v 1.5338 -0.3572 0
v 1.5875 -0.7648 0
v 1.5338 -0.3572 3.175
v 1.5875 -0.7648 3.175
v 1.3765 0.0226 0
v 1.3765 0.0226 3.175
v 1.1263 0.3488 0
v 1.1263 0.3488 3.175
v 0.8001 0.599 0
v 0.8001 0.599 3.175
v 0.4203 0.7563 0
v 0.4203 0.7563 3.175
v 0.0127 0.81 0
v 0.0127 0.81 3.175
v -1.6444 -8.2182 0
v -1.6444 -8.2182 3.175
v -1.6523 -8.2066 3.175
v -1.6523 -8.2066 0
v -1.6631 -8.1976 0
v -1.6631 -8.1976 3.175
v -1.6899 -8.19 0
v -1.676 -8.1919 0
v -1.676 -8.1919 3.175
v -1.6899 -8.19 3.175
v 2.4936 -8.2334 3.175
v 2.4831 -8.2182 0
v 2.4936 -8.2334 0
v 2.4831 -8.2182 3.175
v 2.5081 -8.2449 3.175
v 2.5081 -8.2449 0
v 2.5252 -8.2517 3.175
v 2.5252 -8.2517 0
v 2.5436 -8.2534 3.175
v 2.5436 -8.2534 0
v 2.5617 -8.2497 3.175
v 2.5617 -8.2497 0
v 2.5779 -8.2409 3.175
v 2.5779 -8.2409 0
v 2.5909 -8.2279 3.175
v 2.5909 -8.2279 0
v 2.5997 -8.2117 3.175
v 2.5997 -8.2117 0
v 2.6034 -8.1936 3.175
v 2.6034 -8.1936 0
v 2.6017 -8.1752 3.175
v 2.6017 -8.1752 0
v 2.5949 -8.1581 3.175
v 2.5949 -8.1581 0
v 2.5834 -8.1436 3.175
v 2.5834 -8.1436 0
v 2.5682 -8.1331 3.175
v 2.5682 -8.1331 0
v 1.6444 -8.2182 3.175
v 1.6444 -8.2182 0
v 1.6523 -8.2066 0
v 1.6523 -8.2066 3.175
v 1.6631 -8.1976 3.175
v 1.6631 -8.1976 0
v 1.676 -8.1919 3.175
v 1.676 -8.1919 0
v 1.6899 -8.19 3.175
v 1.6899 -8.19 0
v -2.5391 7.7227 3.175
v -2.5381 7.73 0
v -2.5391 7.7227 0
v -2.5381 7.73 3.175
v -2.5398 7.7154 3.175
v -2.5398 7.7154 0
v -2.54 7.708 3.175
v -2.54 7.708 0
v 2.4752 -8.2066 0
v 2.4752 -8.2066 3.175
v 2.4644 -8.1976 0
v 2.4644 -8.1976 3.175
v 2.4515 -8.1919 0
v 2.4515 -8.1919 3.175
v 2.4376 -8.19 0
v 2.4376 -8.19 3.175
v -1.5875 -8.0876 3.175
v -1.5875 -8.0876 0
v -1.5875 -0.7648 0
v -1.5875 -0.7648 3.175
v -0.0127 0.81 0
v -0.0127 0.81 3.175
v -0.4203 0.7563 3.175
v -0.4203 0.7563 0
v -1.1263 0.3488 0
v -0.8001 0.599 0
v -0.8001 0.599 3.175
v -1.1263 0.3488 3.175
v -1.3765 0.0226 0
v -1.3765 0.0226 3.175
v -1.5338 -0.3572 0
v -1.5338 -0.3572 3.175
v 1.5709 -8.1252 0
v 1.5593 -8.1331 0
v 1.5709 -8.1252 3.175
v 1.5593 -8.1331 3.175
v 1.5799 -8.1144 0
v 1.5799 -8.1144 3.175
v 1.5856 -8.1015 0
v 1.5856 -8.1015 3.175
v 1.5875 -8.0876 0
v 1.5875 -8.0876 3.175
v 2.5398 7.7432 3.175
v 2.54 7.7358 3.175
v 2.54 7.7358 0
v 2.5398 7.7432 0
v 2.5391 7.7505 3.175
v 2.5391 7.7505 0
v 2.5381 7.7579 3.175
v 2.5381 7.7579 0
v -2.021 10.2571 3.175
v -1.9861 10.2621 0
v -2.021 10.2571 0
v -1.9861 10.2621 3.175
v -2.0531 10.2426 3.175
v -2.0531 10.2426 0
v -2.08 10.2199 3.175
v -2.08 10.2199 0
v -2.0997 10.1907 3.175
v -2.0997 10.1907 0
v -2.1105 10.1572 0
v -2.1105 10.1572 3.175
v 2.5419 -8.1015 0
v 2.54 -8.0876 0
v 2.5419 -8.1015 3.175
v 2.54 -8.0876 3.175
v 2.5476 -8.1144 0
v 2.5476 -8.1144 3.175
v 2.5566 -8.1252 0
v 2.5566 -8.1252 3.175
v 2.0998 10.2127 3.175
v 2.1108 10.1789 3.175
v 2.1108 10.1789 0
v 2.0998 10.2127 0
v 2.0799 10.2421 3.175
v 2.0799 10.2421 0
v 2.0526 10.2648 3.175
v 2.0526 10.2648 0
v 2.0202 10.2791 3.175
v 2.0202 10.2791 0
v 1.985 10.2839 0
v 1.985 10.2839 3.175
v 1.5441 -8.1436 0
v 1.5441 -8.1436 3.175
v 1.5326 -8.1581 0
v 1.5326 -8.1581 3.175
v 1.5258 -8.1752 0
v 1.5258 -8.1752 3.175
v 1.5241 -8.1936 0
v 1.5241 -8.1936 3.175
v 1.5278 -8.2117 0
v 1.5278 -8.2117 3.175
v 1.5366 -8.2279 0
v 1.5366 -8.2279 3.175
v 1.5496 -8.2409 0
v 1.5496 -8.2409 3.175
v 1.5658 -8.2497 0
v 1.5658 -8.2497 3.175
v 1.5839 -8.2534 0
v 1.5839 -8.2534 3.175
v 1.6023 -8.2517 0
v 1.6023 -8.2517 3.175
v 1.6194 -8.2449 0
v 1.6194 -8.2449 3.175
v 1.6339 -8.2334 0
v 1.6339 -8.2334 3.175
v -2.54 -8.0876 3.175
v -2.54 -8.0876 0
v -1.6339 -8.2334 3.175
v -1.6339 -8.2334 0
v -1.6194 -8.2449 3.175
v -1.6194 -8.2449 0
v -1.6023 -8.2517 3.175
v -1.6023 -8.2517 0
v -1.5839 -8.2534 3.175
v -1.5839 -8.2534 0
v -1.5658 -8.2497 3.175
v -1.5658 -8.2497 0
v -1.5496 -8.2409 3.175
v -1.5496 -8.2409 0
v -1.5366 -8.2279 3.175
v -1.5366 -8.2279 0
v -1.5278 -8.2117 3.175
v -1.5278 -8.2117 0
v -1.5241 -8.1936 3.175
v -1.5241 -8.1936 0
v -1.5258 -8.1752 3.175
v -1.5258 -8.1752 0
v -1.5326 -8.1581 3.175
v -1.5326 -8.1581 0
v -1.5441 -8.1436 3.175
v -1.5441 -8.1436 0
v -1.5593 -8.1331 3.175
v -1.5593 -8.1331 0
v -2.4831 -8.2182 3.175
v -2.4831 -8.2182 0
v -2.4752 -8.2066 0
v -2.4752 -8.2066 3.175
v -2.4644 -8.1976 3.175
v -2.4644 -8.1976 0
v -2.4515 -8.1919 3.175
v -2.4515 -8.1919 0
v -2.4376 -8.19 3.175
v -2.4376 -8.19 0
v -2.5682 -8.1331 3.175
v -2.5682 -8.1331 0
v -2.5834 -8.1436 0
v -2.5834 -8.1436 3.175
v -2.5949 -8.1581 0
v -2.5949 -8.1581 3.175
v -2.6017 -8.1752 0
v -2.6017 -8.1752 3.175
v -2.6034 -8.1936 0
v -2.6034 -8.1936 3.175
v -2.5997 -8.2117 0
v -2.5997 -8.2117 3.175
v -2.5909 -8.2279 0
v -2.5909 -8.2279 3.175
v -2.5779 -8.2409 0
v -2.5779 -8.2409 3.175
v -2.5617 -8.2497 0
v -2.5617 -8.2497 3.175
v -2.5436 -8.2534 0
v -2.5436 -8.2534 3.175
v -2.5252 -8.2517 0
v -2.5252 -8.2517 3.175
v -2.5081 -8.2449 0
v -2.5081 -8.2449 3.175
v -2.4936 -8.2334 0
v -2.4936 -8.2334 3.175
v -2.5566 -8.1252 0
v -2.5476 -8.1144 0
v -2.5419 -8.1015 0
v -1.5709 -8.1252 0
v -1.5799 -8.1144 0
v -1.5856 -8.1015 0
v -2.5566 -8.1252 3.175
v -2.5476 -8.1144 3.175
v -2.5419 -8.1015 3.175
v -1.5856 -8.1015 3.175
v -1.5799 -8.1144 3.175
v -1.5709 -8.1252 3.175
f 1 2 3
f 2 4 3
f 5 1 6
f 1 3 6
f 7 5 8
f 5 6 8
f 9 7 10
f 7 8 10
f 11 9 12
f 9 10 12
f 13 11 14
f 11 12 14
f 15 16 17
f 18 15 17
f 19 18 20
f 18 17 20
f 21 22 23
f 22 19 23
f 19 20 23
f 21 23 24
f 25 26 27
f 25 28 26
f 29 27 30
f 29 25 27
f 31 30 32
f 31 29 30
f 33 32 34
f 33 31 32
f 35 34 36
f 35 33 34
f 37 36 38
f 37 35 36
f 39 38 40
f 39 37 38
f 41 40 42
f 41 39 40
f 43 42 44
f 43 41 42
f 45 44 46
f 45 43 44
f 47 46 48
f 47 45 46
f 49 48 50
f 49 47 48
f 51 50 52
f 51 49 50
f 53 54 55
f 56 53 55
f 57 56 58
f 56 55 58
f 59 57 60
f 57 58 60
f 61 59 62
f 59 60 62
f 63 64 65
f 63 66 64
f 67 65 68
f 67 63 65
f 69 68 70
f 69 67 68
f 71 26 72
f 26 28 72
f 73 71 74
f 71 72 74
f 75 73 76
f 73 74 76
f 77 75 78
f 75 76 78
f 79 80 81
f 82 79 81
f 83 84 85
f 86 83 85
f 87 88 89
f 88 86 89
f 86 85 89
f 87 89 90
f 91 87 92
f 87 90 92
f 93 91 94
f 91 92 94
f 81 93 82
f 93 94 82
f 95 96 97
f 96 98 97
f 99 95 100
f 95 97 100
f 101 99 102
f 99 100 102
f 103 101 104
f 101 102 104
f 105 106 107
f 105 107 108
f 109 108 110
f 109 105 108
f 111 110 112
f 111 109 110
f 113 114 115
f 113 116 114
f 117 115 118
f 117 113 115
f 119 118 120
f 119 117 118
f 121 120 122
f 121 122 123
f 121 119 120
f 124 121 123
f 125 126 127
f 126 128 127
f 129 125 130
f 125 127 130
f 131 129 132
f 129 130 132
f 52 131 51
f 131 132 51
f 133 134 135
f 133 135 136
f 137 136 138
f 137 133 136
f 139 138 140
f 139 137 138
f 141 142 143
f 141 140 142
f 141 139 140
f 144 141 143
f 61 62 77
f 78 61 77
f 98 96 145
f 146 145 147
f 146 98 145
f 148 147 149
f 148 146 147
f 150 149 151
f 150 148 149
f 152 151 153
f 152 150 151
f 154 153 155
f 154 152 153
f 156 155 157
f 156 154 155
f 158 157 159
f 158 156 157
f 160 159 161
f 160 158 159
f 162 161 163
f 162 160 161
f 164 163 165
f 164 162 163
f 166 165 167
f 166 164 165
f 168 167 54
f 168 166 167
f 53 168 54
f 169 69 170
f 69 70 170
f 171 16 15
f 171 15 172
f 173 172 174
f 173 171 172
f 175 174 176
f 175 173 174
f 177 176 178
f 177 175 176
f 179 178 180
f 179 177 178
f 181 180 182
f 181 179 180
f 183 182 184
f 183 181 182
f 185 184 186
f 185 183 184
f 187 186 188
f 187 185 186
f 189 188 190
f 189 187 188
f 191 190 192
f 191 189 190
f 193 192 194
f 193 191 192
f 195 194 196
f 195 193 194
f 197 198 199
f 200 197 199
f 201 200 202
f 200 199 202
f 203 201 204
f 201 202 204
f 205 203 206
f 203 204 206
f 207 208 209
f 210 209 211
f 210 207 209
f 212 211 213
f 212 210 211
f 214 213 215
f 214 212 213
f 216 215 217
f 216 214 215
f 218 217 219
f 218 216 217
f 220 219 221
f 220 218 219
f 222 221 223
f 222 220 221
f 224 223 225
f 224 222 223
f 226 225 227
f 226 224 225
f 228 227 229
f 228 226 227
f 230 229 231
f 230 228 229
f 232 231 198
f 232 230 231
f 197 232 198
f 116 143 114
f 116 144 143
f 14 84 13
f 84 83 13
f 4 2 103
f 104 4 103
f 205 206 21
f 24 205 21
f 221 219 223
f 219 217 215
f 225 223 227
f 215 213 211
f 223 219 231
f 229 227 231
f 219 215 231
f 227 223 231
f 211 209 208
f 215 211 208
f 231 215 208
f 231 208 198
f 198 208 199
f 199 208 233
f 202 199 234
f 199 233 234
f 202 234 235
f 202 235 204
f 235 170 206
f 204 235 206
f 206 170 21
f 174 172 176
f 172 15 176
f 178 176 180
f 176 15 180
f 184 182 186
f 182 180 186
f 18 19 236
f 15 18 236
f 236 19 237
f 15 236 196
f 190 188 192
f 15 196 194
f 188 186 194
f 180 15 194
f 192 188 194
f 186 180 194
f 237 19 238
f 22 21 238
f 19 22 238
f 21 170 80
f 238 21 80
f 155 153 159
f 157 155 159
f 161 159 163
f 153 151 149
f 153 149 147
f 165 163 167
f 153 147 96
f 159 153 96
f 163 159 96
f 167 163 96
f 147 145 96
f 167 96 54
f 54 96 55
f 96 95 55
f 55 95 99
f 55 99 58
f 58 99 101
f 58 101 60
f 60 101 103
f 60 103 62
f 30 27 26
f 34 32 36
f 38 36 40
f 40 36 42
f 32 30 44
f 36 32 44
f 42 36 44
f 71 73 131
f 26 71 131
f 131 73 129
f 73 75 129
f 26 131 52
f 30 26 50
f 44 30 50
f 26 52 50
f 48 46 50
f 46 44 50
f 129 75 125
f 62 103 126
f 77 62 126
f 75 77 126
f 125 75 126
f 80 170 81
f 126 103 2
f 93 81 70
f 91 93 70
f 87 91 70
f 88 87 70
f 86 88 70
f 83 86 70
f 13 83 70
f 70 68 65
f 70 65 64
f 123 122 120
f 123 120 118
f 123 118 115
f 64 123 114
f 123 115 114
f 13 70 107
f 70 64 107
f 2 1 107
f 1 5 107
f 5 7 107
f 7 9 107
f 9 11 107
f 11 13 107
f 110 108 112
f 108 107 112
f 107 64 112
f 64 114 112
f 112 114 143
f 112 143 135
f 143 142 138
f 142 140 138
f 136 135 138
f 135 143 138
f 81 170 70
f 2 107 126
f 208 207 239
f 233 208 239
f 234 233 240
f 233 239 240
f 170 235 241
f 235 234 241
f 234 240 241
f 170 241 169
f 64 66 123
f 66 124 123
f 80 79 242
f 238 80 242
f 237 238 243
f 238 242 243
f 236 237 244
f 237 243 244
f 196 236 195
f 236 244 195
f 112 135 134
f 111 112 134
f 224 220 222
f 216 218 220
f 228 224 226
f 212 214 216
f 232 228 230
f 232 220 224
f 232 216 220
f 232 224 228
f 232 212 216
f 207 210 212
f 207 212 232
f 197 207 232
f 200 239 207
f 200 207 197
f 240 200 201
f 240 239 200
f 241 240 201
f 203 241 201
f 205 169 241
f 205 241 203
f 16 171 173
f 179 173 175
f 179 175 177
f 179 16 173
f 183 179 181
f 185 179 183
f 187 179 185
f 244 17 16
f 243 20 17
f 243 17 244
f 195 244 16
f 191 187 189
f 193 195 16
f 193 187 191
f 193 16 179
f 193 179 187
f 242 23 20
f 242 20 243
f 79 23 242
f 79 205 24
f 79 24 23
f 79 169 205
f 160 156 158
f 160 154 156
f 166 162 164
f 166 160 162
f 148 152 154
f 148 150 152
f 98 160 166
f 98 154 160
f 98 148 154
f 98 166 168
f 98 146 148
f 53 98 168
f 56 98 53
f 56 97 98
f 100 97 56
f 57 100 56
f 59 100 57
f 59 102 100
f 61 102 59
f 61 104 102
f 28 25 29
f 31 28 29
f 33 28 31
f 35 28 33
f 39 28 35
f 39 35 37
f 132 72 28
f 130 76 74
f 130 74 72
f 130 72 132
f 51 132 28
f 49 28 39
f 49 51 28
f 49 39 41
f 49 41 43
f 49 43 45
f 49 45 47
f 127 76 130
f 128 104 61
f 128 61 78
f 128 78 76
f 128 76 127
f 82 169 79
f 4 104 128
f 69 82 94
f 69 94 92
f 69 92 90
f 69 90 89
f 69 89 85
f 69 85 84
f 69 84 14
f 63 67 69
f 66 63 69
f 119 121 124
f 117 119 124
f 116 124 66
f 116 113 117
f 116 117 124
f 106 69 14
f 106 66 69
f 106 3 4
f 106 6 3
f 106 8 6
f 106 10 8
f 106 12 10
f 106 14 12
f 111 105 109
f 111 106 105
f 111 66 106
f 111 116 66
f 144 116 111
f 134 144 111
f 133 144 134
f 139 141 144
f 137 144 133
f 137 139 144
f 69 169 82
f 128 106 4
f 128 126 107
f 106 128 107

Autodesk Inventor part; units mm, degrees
ref_plane "YZ Plane" through (0, 0, 0) normal (1, 0, 0) x (0, 1, 0)
ref_plane "XZ Plane" through (0, 0, 0) normal (0, 1, 0) x (-1, 0, 0)
ref_plane "XY Plane" through (0, 0, 0) normal (0, 0, 1) x (1, 0, 0)
sketch "Sketch1" plane through (0, 0, 0) normal (0, 0, 1) x (1, 0, 0)
  line L0 (-2.54, -8.19) -> (2.54, -8.19)
  line L1 (2.54, -8.19) -> (2.54, 8.19)
  line L2 (-2.54, 8.19) -> (-2.54, -8.19)
  line L3 (-2.54, -8.19) -> (2.54, 8.19) construction
  line L4 (2.54, -8.19) -> (-2.54, 8.19) construction
  circle A0 centre (0, 16.6545) radius 2.5 construction
  circle A1 centre (0, 16.6545) radius 5
  arc A2 (6.8029, 15.0051) -> (-6.8044, 15.0114) centre (0, 16.6545) ccw
  line L5 (-2.54, 8.19) -> (-2.54, 10.2591)
  line L6 (2.54, 8.19) -> (2.54, 10.2869)
  line L7 (0, 0) -> (0, 10.7842) construction
  line L8 (-2.54, 10.2591) -> (-3.9944, 10.2511)
  line L9 (2.54, 10.2869) -> (3.9944, 10.2948)
  line L10 (-3.9944, 10.2511) -> (-4.1214, 3.9003)
  line L11 (3.9944, 10.2948) -> (4.1214, 3.9454)
  line L12 (-4.1214, 3.9003) -> (-6.8044, 15.0114)
  line L13 (4.1214, 3.9454) -> (6.8029, 15.0051)
  line L14 (0, 0) -> (0, 22.9511) construction
  point P0 (-3.2672, 10.2551)
  dimension "d2" = 5
  dimension "d3" = 10
  dimension "d4" = 14
  dimension "d8" = 1.5815
  dimension "d9" = 1.5815
  dimension "d10" = 6.35
  dimension "d11" = 6.35
  dimension "d18" = 1.4545
  dimension "d19" = 1.4545
  dimension "d31" = 2.54
  dimension "d32" = 2.54
  dimension "d33" = 0
extrude "Plate1" add sketch "Sketch1" along normal blind 3.175
sketch "Sketch2" plane through (0, 0, 0) normal (0, 0, -1) x (-1, 0, 0)
  circle A0 centre (0, 16.6545) radius 5 projected
  line L0 (-3.9944, 10.2948) -> (-4.1214, 3.9454) projected
  line L1 (-2.54, 10.2869) -> (-3.9944, 10.2948) projected
  line L2 (-2.54, -8.19) -> (-2.54, 10.2869) projected
  line L3 (2.54, -8.19) -> (-2.54, -8.19) projected
  line L4 (2.54, 10.2591) -> (2.54, -8.19) projected
  line L5 (3.9944, 10.2511) -> (2.54, 10.2591) projected
  line L6 (4.1214, 3.9003) -> (3.9944, 10.2511) projected
  line L7 (6.8044, 15.0114) -> (4.1214, 3.9003) projected
  arc A1 (6.8044, 15.0114) -> (-6.8029, 15.0051) centre (0, 16.6545) ccw projected
  line L8 (-4.1214, 3.9454) -> (-6.8029, 15.0051) projected
  line L9 (-1.5875, -17.19) -> (1.5875, -17.19)
  line L10 (1.5875, -17.19) -> (1.5875, 0.81)
  line L11 (1.5875, 0.81) -> (-1.5875, 0.81)
  line L12 (-1.5875, 0.81) -> (-1.5875, -17.19)
  line L13 (-1.5875, -17.19) -> (1.5875, 0.81) construction
  line L14 (1.5875, -17.19) -> (-1.5875, 0.81) construction
  point P0 (0, 0)
  point P1 (0, -8.19)
  dimension "d14" = 3.175
extrude "Extrusion1" cut sketch "Sketch2" against normal blind 25.4 contours L12 L11 L10 L3 | L3 L10 L9 L12
sketch "Sketch3" plane through (0, 0, 3.175) normal (0, 0, 1) x (1, 0, 0)
  circle A0 centre (-37.757, 0) radius 3
  line L0 (-39.3445, -2.5456) -> (-36.1695, -2.5456)
  line L1 (-36.1695, -2.5456) -> (-36.1695, 2.5456)
  line L2 (-36.1695, 2.5456) -> (-39.3445, 2.5456)
  line L3 (-39.3445, 2.5456) -> (-39.3445, -2.5456)
  line L4 (-39.3445, -2.5456) -> (-36.1695, 2.5456) construction
  line L5 (-36.1695, -2.5456) -> (-39.3445, 2.5456) construction
  circle A1 centre (-37.757, 0) radius 4
  point P0 (0, 0)
  point P1 (-37.757, 3)
  point P2 (-37.757, 4)
  dimension "d35" = 8
  dimension "d28" = 6
  dimension "d29" = 3.175
  dimension "d30" = 5.0911
  dimension "d34" = 0.4545
  dimension "d36" = 1.4545
sketch "Sketch4" plane through (0, 0, 3.175) normal (0, 0, 1) x (1, 0, 0)
  line L0 (-1.5875, -8.19) -> (-1.5875, 0.81) projected
  line L1 (-1.5875, 0.81) -> (1.5875, 0.81) projected
  line L2 (1.5875, 0.81) -> (1.5875, -8.19) projected
  line L3 (2.54, -8.19) -> (1.5875, -8.19) projected
  line L4 (2.54, 10.2869) -> (2.54, -8.19) projected
  line L5 (3.9944, 10.2948) -> (2.54, 10.2869) projected
  line L6 (4.1214, 3.9454) -> (3.9944, 10.2948) projected
  line L7 (6.8029, 15.0051) -> (4.1214, 3.9454) projected
  arc A0 (6.8029, 15.0051) -> (-6.8044, 15.0114) centre (0, 16.6545) ccw projected
  line L8 (-4.1214, 3.9003) -> (-6.8044, 15.0114) projected
  line L9 (-3.9944, 10.2511) -> (-4.1214, 3.9003) projected
  line L10 (-2.54, 10.2591) -> (-3.9944, 10.2511) projected
  line L11 (-2.54, -8.19) -> (-2.54, 10.2591) projected
  line L12 (-1.5875, -8.19) -> (-2.54, -8.19) projected
  circle A1 centre (0, 16.6545) radius 5 projected
  line L13 (-2.54, 10.2591) -> (-3.7175, 2.2274)
  line L14 (-3.7175, 2.2274) -> (-9.3024, 3.6769)
  line L15 (-9.3024, 3.6769) -> (-11.1796, 30.918)
  line L16 (-11.1796, 30.918) -> (24.5864, 22.2464)
  line L17 (24.5864, 22.2464) -> (4.4395, 2.4617)
  line L18 (4.4395, 2.4617) -> (3.4851, 4.2508)
  line L19 (3.4851, 4.2508) -> (2.54, 10.2869)
  line L20 (2.54, 10.2869) -> (-2.54, 10.2591)
  point P0 (0, 0)
extrude "Extrusion2" cut sketch "Sketch4" against normal blind 25.4 contours L13 L14 L15 L16 L17 L18 L19 L5 L6 L7 A0 L8 L9 L10 | L10 L9 L8 A0 L7 L6 L5 L20 | A1
chamfer "Chamfer3" distance 2.54 angle 10 1 edges at (2.54, 10.2869, 1.5875) measured on face at (2.54, -2.0311, 1.0583)
chamfer "Chamfer4" distance 2.54 angle 10 1 edges at (-2.54, 10.2591, 1.5875) measured on face at (-2.54, -2.0403, 1.0583)
fillet "Fillet5" radius 0.127 4 edges at (-2.0921, 10.2615, 1.5875) (-2.54, 7.7191, 1.5875) (2.0921, 10.2844, 1.5875) (2.54, 7.7469, 1.5875)
fillet "Fillet6" radius 1.5748 2 edges at (-1.5875, 0.81, 1.5875) (1.5875, 0.81, 1.5875)
sketch "Sketch5" plane through (0, 0, 3.175) normal (0, 0, 1) x (1, 0, 0)
  arc A0 (2.54, 7.7358) -> (2.5381, 7.7578) centre (2.413, 7.7358) ccw projected
  line L0 (2.1112, 10.1789) -> (2.5381, 7.7578) projected
  arc A1 (2.1112, 10.1789) -> (1.9854, 10.2839) centre (1.9861, 10.1569) ccw projected
  line L1 (1.9854, 10.2839) -> (-1.9857, 10.2621) projected
  arc A2 (-1.9857, 10.2621) -> (-2.1101, 10.1572) centre (-1.985, 10.1351) ccw projected
  line L2 (-2.5381, 7.73) -> (-2.1101, 10.1572) projected
  arc A3 (-2.5381, 7.73) -> (-2.54, 7.708) centre (-2.413, 7.708) ccw projected
  line L3 (-2.54, -8.19) -> (-2.54, 7.708) projected
  line L4 (-1.5875, -8.19) -> (-2.54, -8.19) projected
  line L5 (-1.5875, -8.19) -> (-1.5875, -0.7648) projected
  arc A4 (-0.0127, 0.81) -> (-1.5875, -0.7648) centre (-0.0127, -0.7648) ccw projected
  line L6 (-0.0127, 0.81) -> (0.0127, 0.81) projected
  arc A5 (1.5875, -0.7648) -> (0.0127, 0.81) centre (0.0127, -0.7648) ccw projected
  line L7 (1.5875, -0.7648) -> (1.5875, -8.19) projected
  line L8 (2.54, -8.19) -> (1.5875, -8.19) projected
  line L9 (2.54, 7.7358) -> (2.54, -8.19) projected
  circle A6 centre (-2.54, -8.19) radius 0.0635
  circle A7 centre (-1.5875, -8.19) radius 0.0635
  circle A8 centre (1.5875, -8.19) radius 0.0635
  circle A9 centre (2.54, -8.19) radius 0.0635
  point P0 (0, 0)
  dimension "d48" = 0.127
  dimension "d49" = 0.127
  dimension "d50" = 0.127
  dimension "d51" = 0.127
extrude "Extrusion3" add sketch "Sketch5" against normal up to surface (3.175 mm away) contours A9 L8 L9 | L9 L8 A9 | A8 L7 L8 | L8 L7 A8 | A6 L4 L3 | L3 L4 A6 | A7 L4 L5 | L5 L4 A7
fillet "Fillet7" radius 0.0508 8 edges at (-1.651, -8.19, 1.5875) (-2.4765, -8.19, 1.5875) (-2.54, -8.1265, 1.5875) (-1.5875, -8.1265, 1.5875) (2.54, -8.1265, 1.5875) (1.651, -8.19, 1.5875) (1.5875, -8.1265, 1.5875) (2.4765, -8.19, 1.5875)
equation "\"d18\" = d36"
equation "\"d19\" = d36"
equation "\"d49\" = d48"
equation "\"d50\" = d48"
equation "\"d51\" = d48"
equation "\"BendRadius\" = Thickness"
equation "\"BendReliefWidth\" = Thickness"
equation "\"BendReliefDepth\" = 0.5 * Thickness"
equation "\"CornerReliefSize\" = 4 * Thickness"
equation "\"MinimumRemnant\" = 2 * Thickness"
equation "\"TransitionRadius\" = BendRadius"
equation "\"JacobiRadiusSize\" = BendRadius"
equation "\"GapSize\" = Thickness"
equation "\"d12\" = BendRadius"
equation "\"Thickness\" = 3.175"
properties part number "8mm OD 6mm ID Rod Cross125"
